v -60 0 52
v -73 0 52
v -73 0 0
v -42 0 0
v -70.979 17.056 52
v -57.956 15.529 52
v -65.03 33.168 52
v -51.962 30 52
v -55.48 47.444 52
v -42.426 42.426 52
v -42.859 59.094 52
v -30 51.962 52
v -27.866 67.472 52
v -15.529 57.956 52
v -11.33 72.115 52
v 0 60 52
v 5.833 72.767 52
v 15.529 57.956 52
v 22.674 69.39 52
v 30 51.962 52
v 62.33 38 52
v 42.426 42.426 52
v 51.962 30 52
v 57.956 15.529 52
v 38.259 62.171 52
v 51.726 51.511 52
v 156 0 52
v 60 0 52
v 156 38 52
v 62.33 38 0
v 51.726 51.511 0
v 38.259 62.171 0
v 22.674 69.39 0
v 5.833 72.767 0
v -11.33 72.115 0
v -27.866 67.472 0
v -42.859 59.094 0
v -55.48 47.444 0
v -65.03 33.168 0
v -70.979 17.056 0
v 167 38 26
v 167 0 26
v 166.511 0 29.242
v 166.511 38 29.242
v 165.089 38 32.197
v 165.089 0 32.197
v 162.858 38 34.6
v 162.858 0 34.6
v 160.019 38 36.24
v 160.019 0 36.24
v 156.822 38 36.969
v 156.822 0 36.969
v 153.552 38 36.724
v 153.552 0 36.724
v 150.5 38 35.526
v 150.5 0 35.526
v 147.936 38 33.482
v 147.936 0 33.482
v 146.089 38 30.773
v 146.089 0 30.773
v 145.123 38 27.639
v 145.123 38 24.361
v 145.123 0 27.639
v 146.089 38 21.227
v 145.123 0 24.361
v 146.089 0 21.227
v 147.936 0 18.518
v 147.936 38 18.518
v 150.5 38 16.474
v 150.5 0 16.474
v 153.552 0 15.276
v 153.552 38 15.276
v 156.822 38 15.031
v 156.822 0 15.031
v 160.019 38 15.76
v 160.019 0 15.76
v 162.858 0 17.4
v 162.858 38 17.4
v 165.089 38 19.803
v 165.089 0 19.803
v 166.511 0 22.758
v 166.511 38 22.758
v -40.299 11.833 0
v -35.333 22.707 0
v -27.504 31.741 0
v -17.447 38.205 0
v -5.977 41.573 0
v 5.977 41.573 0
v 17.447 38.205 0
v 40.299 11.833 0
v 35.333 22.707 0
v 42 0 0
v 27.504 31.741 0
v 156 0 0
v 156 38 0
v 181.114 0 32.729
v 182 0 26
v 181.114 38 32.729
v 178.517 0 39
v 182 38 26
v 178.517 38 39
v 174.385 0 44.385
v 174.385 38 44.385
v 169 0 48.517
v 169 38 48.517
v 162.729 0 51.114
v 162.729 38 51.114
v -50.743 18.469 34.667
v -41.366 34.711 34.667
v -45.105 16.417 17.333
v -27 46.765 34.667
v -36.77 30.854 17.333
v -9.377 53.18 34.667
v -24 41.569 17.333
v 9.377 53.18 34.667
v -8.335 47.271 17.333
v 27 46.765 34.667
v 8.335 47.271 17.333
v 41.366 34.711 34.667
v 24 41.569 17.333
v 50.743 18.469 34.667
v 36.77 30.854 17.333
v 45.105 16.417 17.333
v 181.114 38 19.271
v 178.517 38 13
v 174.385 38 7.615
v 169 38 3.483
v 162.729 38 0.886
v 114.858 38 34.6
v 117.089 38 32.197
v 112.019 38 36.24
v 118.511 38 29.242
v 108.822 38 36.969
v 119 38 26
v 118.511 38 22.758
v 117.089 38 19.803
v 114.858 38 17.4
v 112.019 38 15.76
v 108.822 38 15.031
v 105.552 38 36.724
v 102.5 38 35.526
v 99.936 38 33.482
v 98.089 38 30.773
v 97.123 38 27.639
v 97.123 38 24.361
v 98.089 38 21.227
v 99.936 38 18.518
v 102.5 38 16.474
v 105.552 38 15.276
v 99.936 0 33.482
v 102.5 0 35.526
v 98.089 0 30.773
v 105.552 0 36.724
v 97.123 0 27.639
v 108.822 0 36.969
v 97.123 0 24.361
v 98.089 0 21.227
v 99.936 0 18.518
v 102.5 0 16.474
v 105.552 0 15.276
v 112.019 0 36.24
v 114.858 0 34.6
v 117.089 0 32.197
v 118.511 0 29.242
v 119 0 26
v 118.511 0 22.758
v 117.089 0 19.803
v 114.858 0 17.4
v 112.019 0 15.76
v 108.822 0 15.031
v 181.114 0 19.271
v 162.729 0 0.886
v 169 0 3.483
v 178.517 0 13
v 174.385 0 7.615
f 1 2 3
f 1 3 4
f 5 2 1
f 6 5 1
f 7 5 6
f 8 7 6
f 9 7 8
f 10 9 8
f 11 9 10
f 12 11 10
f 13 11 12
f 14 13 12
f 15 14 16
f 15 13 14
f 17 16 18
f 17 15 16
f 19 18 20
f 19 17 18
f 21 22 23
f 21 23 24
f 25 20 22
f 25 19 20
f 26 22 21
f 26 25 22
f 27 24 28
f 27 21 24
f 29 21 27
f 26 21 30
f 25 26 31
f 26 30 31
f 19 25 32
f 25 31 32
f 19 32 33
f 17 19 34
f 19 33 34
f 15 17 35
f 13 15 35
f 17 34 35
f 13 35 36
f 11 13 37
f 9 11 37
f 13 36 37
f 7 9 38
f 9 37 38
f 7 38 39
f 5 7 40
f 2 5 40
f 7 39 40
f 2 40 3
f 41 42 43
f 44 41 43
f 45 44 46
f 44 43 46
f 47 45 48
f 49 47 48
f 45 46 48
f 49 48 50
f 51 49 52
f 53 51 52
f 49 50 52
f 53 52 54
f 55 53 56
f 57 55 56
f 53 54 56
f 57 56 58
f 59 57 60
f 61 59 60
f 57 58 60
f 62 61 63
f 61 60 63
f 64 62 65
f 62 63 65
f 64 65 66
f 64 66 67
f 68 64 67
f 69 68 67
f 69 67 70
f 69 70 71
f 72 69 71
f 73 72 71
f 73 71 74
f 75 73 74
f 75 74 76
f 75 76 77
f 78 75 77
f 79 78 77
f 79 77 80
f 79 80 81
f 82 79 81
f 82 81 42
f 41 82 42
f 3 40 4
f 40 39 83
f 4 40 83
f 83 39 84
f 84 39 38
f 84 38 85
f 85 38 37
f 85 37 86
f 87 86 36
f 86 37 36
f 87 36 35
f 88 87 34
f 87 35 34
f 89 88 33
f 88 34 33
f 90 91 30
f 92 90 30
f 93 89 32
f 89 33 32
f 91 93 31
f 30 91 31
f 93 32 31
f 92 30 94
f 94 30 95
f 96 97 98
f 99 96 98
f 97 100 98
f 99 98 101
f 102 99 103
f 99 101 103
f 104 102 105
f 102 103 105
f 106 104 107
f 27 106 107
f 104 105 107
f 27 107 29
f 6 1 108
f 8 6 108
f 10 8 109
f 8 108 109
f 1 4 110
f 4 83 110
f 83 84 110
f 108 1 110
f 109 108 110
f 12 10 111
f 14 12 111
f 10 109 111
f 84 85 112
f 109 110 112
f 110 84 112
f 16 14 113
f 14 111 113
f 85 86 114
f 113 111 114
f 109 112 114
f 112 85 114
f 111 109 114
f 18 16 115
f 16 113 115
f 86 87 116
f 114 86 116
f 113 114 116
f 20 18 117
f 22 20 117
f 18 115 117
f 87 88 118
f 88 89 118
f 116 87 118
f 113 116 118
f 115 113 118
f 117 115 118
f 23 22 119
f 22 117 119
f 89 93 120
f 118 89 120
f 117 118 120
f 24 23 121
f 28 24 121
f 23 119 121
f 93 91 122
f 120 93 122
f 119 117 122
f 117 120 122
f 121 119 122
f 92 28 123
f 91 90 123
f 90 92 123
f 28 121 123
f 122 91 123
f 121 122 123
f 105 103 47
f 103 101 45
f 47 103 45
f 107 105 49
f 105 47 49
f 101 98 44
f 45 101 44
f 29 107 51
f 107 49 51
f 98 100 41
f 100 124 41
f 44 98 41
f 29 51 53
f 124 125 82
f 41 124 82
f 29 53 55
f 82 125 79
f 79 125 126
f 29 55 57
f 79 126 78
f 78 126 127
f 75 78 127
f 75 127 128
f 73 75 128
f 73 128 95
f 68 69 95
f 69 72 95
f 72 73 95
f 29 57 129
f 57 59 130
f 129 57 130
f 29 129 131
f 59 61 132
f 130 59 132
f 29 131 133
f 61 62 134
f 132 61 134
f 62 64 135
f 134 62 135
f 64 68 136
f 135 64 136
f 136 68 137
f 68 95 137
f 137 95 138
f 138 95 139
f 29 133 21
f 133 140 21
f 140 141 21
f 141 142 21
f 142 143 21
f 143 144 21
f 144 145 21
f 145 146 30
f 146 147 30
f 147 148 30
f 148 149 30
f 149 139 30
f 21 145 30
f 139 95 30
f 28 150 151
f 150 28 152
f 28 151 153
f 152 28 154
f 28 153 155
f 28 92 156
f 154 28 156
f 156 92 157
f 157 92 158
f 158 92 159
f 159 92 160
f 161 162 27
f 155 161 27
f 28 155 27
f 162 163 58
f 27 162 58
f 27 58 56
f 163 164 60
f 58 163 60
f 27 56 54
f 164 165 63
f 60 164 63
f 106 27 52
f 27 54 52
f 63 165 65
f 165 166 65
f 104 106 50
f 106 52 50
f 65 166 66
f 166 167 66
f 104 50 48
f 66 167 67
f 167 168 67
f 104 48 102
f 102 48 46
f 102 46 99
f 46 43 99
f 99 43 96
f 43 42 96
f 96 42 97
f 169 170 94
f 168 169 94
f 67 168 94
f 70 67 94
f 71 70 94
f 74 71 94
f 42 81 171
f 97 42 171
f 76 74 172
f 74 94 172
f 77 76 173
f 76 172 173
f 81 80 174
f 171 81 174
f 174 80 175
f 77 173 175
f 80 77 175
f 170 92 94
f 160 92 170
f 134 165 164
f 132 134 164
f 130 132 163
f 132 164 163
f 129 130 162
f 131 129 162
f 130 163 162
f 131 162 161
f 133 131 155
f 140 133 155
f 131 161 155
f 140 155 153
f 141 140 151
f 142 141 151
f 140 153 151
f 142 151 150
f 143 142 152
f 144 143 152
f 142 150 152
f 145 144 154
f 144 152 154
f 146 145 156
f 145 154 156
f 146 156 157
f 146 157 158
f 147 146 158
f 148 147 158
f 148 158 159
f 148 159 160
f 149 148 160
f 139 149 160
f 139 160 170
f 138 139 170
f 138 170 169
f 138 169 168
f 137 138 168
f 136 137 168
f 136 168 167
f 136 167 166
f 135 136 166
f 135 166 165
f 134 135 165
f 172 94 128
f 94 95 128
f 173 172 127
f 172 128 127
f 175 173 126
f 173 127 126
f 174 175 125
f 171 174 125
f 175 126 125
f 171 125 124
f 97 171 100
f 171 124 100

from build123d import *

# Parameters (mm, degrees)
F1_DEPTH = 52
F4_R     = 11
F5_DEPTH = 44.7
F6_R     = 25.99999


# Not quite as in the source:
# - a fillet or chamfer is up to 0.001 mm smaller than in the source, because OpenCascade refuses the exact size


with BuildPart() as f1:
    # F0 (on Top) → F1 (new body)
    with BuildSketch(Plane.XY):
        with BuildLine():
            ThreePointArc((-42, 0), (0, 42), (42, 0))
            Line((42, 0), (182, 0))
            Line((182, 0), (182, 38))
            Line((182, 38), (62.329768169, 38))
            ThreePointArc((62.329768169, 38), (-19.7348286497, 70.2818364741), (-73, 0))
            Line((-73, 0), (-42, 0))
        make_face()
    extrude(amount=F1_DEPTH)

    # F2 (on face) → F3 (revolve, cut)
    with BuildSketch(Plane.XZ):
        Polygon((0, 0), (0, 52), (-60, 52), (-42, 0), align=None)
    revolve(axis=Axis((0, 0, 26), (0, 0, -1)), mode=Mode.SUBTRACT)

    # F4 (on face) → F5 (cut)
    with BuildSketch(Plane.XZ):
        with Locations((108, 26)):
            Circle(F4_R)
        with Locations((156, 26)):
            Circle(F4_R)
    extrude(amount=-F5_DEPTH, mode=Mode.SUBTRACT)

    # F6 (radius 26 in the source; OpenCascade refuses exactly that, so slightly less here)
    f6_edges = [f1.edges().sort_by_distance(p)[0] for p in [
        (182, 19, 52),
        (182, 19, 0),
    ]]
    fillet(f6_edges, radius=F6_R)


solid = f1.part
